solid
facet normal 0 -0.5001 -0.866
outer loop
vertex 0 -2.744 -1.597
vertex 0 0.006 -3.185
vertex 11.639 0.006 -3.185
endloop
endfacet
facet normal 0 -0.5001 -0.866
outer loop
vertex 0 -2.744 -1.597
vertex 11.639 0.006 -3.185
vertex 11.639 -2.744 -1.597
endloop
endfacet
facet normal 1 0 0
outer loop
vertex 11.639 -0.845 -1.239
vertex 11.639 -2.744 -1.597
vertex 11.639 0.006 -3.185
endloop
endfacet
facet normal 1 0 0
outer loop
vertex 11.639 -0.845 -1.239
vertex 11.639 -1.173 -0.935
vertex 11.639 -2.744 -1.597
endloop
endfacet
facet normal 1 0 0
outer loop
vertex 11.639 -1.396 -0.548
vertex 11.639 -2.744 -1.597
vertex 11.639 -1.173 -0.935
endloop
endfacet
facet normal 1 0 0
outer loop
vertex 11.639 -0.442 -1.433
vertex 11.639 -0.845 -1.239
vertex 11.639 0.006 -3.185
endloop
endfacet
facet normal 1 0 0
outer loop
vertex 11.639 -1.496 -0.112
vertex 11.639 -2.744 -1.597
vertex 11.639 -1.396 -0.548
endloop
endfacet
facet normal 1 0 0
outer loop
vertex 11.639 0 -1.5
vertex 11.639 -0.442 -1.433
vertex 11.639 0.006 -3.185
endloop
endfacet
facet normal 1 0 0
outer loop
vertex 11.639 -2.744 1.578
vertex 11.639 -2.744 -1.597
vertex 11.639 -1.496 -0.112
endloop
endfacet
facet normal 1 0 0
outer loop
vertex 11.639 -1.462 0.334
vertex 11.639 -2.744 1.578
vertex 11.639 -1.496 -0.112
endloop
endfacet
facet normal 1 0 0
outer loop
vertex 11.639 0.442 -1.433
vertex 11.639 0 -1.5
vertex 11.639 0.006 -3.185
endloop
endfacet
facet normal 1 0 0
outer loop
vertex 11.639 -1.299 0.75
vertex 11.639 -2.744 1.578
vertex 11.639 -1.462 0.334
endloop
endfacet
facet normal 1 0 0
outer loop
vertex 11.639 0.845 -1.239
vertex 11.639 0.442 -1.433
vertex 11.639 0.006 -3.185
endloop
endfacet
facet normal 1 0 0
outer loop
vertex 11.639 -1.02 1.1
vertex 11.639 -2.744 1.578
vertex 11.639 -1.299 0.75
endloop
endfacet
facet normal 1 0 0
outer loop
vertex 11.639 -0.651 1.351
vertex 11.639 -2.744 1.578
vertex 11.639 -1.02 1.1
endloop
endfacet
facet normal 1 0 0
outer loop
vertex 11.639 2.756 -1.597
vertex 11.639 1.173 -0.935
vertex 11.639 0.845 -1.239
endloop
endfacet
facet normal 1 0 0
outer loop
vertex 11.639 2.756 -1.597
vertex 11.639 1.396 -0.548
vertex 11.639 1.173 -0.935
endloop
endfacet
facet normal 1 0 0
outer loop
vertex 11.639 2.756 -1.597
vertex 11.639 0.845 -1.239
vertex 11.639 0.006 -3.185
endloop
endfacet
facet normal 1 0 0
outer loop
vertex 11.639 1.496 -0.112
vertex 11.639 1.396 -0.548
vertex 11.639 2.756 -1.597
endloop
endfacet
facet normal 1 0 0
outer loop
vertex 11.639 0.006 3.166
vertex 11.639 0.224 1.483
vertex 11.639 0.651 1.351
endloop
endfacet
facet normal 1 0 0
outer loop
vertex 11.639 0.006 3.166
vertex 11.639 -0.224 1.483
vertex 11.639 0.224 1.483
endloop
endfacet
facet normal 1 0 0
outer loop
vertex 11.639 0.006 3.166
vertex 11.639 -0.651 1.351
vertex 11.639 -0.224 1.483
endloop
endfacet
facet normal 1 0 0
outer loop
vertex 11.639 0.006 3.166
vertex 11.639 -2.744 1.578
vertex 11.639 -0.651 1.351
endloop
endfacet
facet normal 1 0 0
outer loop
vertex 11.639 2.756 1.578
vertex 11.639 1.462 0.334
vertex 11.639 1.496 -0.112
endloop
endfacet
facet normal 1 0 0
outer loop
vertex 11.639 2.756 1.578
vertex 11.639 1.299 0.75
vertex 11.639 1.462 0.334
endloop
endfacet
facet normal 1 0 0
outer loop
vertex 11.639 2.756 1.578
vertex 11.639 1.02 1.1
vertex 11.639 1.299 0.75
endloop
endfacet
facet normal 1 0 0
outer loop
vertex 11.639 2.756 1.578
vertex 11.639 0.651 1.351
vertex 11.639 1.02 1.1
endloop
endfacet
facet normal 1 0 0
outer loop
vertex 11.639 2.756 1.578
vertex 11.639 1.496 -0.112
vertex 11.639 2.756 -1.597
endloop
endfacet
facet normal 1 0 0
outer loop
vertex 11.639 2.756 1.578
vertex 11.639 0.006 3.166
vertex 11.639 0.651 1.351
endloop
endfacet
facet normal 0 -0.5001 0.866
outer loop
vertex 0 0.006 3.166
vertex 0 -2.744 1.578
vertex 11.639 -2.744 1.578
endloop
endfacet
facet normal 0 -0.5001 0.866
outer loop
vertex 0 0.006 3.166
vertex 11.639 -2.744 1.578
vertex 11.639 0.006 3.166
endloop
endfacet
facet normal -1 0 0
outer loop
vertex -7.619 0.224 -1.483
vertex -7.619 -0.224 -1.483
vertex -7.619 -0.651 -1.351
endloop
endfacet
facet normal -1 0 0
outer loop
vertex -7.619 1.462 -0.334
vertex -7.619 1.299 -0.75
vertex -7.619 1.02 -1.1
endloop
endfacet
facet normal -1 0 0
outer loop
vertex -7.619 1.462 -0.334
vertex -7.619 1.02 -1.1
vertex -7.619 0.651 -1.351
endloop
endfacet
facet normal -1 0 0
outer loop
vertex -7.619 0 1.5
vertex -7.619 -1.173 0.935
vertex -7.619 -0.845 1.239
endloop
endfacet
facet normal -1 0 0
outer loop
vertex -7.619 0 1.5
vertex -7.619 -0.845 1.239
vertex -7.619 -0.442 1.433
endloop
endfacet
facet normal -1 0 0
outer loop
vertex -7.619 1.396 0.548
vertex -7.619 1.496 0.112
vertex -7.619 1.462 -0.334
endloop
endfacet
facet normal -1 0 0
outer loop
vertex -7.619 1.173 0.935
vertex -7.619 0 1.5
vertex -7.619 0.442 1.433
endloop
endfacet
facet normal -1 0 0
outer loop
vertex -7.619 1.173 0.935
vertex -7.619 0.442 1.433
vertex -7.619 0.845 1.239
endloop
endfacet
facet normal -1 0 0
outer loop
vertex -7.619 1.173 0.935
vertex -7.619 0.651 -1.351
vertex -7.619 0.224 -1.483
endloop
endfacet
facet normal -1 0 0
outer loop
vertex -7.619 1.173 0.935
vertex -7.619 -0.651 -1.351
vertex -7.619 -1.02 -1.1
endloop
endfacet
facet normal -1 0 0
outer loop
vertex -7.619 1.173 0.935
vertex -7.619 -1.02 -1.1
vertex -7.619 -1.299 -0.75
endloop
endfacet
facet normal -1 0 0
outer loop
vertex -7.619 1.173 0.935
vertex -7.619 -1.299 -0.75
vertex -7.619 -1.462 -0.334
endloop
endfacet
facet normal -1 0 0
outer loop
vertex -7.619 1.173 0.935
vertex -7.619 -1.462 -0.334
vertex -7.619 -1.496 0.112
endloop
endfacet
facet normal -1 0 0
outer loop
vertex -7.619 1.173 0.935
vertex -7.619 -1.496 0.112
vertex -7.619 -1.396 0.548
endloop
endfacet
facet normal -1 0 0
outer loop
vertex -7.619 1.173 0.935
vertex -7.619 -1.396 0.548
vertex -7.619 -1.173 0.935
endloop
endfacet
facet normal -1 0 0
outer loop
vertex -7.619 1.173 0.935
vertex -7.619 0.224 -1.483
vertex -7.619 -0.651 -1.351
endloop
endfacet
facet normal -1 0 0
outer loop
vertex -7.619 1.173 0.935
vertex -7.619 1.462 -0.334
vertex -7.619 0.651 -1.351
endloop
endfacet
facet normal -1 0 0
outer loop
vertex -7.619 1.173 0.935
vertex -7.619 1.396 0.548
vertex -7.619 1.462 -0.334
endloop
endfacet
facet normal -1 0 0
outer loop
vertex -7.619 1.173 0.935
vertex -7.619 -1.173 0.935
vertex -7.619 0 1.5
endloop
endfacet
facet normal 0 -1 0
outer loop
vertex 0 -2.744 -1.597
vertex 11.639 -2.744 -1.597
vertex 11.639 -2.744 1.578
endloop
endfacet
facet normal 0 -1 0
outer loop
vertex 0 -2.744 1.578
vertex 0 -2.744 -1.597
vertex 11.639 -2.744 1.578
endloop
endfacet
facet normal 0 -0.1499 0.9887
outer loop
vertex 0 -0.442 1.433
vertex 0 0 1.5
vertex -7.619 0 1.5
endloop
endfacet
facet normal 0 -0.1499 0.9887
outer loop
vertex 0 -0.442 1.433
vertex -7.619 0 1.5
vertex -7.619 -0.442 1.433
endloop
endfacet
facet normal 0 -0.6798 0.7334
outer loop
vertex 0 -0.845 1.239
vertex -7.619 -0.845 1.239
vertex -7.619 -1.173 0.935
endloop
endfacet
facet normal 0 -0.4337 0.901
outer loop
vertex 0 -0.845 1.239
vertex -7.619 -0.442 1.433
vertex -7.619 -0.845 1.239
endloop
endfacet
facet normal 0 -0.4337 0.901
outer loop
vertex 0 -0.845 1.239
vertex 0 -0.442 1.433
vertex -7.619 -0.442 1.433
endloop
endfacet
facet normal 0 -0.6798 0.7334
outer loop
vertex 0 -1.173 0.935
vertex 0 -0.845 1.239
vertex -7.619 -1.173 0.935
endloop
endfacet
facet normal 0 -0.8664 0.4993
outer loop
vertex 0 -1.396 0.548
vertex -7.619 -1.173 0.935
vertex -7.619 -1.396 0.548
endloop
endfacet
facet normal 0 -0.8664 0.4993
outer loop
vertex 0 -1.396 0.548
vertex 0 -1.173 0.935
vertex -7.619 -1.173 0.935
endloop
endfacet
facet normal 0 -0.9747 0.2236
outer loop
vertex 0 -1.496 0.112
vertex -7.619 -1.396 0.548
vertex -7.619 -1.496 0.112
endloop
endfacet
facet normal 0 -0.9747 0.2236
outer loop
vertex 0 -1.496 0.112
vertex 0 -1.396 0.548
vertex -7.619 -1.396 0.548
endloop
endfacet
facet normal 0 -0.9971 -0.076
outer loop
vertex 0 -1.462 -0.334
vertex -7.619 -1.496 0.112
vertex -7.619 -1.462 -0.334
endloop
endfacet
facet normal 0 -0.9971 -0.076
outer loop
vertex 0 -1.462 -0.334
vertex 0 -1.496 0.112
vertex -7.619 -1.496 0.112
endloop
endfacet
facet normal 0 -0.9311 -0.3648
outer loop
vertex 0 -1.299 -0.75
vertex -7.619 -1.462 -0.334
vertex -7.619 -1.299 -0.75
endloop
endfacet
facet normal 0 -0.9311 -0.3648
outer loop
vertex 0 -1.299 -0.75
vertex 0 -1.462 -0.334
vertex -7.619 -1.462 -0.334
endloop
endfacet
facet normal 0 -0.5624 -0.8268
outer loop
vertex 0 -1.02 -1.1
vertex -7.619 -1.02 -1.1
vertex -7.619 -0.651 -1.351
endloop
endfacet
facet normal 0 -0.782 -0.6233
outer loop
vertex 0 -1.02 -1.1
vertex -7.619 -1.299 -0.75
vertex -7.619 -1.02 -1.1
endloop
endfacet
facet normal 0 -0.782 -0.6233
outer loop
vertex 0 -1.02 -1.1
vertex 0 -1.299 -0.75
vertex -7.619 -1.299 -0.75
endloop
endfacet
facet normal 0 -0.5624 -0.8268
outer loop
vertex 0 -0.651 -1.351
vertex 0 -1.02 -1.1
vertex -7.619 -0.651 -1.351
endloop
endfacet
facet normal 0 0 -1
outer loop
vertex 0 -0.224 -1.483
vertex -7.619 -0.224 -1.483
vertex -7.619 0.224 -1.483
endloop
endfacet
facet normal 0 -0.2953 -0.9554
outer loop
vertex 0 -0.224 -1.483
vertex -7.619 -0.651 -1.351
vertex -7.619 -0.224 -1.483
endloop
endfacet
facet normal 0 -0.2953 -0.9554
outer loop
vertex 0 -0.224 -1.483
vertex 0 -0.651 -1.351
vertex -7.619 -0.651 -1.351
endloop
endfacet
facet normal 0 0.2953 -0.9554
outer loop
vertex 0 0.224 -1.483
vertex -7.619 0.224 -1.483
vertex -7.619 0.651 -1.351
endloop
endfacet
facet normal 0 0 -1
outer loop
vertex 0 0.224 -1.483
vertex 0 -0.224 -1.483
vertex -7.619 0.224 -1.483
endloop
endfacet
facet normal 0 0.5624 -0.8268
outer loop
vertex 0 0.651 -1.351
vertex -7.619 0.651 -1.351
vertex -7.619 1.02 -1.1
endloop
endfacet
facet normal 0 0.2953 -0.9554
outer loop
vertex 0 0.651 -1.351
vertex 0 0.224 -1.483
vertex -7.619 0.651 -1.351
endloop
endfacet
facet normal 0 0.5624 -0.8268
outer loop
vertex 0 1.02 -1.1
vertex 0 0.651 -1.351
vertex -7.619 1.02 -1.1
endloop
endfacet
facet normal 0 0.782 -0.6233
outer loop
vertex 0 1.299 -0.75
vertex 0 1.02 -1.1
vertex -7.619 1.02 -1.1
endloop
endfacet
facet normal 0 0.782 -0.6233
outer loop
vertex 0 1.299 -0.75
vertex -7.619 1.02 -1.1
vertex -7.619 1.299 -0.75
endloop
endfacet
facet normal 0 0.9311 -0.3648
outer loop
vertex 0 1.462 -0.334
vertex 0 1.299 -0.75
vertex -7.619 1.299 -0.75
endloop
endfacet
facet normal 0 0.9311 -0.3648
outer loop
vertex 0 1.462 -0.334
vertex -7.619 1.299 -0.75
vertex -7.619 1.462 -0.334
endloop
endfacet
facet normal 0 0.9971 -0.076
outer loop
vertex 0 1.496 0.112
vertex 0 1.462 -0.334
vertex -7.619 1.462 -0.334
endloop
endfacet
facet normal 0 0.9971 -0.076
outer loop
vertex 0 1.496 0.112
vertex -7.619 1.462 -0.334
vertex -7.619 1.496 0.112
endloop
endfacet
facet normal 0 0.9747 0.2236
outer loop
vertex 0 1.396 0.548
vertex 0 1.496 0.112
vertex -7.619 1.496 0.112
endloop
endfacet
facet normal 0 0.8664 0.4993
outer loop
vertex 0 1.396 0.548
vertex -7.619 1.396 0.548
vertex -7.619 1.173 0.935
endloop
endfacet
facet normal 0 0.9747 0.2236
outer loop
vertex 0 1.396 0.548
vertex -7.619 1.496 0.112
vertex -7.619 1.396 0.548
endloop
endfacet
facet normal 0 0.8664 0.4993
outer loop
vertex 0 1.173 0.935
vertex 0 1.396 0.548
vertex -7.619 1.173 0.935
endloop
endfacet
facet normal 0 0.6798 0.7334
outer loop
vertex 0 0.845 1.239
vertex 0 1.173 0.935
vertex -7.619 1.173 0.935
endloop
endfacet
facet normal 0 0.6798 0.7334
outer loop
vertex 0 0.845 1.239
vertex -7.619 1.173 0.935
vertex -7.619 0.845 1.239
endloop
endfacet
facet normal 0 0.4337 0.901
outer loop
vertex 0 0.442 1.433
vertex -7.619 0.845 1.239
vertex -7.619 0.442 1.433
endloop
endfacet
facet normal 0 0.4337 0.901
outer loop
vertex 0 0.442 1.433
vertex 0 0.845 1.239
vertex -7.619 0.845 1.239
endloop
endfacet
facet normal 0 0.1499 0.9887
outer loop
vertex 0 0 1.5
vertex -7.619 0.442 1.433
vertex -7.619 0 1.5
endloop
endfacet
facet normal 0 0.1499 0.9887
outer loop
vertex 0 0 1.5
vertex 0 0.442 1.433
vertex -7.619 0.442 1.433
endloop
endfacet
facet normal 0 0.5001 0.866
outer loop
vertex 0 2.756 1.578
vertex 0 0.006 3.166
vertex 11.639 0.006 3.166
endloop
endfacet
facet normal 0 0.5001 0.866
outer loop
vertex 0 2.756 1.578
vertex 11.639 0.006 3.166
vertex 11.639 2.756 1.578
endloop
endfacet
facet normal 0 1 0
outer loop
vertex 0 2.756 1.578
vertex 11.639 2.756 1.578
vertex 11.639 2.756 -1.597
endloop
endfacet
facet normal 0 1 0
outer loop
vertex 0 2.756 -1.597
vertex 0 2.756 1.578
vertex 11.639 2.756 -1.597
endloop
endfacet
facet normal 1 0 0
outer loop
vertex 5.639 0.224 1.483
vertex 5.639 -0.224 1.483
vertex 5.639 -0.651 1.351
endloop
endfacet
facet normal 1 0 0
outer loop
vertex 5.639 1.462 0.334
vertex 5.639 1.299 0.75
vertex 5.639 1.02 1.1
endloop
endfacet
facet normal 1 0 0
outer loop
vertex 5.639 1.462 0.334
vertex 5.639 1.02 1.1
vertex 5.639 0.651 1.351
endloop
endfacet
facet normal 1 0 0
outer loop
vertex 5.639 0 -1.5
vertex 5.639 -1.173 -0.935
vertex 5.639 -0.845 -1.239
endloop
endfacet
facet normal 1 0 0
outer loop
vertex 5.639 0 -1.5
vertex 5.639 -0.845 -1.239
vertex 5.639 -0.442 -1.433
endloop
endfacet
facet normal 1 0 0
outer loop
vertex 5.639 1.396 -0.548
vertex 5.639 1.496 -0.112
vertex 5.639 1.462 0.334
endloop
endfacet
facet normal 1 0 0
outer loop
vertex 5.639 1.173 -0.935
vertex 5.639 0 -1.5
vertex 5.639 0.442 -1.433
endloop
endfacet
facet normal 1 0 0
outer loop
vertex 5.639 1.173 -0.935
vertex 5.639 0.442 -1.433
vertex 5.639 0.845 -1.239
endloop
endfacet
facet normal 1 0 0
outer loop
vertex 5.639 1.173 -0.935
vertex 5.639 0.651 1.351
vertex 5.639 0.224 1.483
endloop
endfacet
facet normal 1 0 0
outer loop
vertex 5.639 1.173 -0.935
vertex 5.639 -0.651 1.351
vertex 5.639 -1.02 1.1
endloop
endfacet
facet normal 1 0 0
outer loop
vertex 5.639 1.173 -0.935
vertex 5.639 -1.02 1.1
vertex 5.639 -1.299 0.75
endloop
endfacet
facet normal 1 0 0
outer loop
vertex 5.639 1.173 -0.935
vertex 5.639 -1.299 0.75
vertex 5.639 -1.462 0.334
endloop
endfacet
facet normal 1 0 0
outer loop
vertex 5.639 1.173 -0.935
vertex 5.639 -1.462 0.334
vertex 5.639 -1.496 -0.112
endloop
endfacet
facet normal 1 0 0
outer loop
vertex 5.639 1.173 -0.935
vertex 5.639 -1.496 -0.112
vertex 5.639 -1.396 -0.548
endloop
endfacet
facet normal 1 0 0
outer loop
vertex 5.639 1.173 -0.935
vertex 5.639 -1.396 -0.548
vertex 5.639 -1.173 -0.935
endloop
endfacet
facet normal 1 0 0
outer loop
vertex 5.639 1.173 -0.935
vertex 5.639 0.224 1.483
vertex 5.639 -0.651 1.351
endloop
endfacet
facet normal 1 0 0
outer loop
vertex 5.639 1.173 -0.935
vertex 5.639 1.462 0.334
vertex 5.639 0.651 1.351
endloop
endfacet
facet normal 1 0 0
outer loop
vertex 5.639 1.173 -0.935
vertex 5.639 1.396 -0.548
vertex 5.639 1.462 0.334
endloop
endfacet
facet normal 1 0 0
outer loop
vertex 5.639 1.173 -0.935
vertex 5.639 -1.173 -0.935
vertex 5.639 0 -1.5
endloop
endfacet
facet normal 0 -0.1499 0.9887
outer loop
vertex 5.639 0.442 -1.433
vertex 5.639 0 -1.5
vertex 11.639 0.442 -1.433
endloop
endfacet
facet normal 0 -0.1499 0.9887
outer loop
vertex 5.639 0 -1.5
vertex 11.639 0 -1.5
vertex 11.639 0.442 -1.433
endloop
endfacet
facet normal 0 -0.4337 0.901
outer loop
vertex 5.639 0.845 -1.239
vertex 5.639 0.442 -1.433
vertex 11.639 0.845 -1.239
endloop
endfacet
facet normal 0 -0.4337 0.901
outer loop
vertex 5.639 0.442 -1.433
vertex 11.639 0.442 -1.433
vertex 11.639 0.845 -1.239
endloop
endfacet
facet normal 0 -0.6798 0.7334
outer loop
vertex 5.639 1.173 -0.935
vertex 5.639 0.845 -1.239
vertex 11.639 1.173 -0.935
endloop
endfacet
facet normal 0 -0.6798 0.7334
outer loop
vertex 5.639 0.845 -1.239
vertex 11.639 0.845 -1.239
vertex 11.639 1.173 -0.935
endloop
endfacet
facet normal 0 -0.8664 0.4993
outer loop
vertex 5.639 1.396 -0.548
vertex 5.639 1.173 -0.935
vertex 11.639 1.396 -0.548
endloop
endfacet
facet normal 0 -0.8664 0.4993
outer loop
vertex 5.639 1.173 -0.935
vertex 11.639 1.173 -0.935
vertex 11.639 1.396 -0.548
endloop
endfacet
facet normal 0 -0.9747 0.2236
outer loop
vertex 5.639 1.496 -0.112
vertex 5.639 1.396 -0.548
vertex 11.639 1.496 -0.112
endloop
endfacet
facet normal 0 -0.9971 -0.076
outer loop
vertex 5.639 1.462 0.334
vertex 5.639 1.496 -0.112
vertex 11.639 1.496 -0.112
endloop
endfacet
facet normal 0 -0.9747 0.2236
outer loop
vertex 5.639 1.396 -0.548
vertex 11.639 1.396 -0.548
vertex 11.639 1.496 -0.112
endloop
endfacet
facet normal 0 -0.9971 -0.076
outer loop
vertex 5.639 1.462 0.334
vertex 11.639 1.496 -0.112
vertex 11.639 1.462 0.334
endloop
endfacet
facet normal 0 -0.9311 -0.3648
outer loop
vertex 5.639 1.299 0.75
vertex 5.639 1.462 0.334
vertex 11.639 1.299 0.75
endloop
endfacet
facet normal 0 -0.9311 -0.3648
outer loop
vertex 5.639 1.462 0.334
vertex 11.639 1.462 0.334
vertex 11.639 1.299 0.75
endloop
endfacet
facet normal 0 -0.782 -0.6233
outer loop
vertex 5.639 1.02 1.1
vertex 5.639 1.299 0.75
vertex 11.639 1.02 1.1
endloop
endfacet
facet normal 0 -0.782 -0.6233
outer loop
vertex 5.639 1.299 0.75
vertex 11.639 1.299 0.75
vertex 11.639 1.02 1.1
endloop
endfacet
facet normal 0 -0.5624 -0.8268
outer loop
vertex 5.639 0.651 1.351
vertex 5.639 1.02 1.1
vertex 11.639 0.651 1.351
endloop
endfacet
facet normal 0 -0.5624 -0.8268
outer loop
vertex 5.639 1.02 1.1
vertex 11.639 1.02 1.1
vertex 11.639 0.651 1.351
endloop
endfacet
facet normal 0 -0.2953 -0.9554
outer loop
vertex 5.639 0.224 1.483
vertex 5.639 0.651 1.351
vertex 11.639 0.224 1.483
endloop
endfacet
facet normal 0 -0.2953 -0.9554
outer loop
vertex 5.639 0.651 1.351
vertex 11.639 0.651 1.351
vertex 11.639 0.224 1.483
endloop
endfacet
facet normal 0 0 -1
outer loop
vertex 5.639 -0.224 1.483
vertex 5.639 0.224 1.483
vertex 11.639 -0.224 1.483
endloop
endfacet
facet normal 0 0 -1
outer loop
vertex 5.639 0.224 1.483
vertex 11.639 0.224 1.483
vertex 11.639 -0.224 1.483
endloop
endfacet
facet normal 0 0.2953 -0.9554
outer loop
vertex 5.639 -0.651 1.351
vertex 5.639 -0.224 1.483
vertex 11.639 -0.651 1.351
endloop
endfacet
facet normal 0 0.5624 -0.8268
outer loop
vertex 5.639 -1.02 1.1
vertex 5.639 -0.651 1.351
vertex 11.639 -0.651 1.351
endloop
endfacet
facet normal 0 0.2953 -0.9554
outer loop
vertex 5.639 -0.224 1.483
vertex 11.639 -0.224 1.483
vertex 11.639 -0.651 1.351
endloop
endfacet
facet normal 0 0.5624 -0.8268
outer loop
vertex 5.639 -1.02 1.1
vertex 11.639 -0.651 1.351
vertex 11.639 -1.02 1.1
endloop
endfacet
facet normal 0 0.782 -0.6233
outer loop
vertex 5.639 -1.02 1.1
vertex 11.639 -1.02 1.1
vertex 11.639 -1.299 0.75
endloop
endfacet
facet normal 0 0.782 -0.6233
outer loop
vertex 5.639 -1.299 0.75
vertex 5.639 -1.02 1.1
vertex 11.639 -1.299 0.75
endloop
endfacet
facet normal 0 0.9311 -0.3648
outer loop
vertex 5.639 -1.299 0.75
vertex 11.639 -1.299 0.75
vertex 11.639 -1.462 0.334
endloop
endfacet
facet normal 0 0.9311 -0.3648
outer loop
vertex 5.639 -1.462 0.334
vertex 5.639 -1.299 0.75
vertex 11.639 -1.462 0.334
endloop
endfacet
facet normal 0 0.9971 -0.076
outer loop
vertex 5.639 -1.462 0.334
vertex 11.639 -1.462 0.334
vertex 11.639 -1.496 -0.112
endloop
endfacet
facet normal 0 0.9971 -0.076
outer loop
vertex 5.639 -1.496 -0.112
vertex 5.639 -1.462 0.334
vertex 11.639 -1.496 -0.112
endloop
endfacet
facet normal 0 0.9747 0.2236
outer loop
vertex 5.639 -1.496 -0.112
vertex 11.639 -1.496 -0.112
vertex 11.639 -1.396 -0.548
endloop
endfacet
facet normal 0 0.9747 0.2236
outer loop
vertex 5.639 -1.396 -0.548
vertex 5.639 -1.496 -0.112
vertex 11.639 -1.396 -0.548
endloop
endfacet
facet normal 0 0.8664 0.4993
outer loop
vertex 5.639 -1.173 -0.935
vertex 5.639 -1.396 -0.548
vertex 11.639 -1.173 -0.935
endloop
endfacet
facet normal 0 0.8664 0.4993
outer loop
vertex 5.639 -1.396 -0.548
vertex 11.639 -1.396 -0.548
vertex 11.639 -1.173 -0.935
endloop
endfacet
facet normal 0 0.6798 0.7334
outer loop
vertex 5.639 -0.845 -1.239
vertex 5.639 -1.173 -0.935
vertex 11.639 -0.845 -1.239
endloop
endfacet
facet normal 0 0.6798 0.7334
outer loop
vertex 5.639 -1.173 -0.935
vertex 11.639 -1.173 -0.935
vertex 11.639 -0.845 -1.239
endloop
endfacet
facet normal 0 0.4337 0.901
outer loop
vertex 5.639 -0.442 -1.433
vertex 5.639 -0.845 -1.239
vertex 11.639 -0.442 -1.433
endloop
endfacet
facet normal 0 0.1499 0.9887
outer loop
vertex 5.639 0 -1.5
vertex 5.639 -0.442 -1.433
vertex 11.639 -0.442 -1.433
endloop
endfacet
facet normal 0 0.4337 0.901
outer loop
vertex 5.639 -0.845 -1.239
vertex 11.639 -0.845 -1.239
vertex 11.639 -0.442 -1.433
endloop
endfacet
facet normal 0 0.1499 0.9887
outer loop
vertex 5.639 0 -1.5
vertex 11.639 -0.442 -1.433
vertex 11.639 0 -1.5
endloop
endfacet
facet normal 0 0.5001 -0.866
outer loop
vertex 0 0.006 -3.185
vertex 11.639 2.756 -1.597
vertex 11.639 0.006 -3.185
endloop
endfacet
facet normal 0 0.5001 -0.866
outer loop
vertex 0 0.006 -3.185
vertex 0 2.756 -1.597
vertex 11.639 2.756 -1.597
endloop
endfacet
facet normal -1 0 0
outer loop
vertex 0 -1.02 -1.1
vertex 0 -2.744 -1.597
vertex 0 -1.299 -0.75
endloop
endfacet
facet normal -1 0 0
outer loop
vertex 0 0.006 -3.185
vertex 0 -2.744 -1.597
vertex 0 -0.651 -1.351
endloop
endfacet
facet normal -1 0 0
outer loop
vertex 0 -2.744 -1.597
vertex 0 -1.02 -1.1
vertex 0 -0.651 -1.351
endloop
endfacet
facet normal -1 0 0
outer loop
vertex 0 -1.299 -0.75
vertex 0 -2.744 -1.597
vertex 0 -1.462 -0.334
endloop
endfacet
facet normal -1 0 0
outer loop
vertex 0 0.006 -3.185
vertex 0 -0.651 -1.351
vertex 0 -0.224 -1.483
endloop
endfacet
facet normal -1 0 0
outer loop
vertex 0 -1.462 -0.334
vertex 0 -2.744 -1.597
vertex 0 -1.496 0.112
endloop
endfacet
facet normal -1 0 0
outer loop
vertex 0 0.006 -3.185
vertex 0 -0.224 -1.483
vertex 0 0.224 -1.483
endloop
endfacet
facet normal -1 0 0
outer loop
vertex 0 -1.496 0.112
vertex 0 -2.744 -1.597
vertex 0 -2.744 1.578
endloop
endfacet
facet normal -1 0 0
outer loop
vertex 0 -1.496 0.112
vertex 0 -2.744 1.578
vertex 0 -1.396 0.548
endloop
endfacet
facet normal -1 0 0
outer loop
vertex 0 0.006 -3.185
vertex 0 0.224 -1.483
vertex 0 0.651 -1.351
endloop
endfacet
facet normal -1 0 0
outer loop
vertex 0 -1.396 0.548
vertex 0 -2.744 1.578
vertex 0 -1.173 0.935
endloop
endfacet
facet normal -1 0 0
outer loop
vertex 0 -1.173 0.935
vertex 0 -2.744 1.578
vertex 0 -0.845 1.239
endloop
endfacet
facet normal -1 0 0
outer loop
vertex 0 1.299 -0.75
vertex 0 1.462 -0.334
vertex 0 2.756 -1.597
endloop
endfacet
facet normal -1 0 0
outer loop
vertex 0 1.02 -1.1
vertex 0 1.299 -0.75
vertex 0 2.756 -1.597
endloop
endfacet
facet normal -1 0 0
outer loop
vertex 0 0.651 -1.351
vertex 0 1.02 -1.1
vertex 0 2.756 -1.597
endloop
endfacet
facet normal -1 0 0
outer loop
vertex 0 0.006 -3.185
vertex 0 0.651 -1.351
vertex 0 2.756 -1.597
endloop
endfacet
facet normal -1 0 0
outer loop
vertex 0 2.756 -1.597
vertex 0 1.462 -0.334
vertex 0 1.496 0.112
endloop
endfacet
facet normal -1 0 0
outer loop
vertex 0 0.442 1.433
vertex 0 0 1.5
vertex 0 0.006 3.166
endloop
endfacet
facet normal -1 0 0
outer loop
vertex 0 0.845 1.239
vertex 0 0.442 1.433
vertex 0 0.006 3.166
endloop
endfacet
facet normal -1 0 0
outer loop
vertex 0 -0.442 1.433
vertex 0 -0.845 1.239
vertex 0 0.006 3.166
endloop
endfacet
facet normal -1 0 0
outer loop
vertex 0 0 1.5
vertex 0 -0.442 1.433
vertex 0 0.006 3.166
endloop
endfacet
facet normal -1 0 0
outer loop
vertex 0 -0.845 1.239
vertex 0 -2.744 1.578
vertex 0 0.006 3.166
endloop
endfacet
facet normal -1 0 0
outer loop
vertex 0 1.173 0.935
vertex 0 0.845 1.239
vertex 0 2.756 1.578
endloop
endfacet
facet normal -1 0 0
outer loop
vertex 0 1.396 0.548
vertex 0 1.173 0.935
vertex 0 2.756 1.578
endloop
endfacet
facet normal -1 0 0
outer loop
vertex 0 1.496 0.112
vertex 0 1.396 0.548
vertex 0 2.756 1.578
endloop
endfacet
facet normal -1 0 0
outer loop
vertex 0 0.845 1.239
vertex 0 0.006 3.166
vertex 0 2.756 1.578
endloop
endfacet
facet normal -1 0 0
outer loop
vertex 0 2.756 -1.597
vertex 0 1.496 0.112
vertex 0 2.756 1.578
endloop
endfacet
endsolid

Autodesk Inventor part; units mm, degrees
ref_plane "YZ Plane" through (0, 0, 0) normal (1, 0, 0) x (0, 1, 0)
ref_plane "XZ Plane" through (0, 0, 0) normal (0, 1, 0) x (-1, 0, 0)
ref_plane "XY Plane" through (0, 0, 0) normal (0, 0, 1) x (1, 0, 0)
sketch "Sketch1" plane through (0, 0, 0) normal (1, 0, 0) x (0, 1, 0)
  line L0 (0.0055, 3.1659) -> (2.7555, 1.5782)
  line L1 (2.7555, 1.5782) -> (2.7555, -1.5973)
  line L2 (2.7555, -1.5973) -> (0.0055, -3.185)
  line L3 (0.0055, -3.185) -> (-2.7445, -1.5973)
  line L4 (-2.7445, -1.5973) -> (-2.7445, 1.5782)
  line L5 (-2.7445, 1.5782) -> (0.0055, 3.1659)
  point P0 (0.0055, -0.0095)
  dimension "d1" = 5.5
extrude "Extrusion1" add sketch "Sketch1" along normal blind 11.639
sketch "Sketch2" plane through (0, 0, 0) normal (-1, 0, 0) x (0, 0, 1)
  circle A0 centre (0, 0) radius 1.5
  dimension "d4" = 3
extrude "Extrusion2" add sketch "Sketch2" along normal blind 7.619
sketch "Sketch3" plane through (11.639, 0, 0) normal (1, 0, 0) x (0, 0, -1)
  circle A0 centre (0, 0) radius 1.5
  dimension "d7" = 3
extrude "Extrusion3" cut sketch "Sketch3" against normal blind 6
properties part number "Spacer" material "Brass, Soft Yellow"
